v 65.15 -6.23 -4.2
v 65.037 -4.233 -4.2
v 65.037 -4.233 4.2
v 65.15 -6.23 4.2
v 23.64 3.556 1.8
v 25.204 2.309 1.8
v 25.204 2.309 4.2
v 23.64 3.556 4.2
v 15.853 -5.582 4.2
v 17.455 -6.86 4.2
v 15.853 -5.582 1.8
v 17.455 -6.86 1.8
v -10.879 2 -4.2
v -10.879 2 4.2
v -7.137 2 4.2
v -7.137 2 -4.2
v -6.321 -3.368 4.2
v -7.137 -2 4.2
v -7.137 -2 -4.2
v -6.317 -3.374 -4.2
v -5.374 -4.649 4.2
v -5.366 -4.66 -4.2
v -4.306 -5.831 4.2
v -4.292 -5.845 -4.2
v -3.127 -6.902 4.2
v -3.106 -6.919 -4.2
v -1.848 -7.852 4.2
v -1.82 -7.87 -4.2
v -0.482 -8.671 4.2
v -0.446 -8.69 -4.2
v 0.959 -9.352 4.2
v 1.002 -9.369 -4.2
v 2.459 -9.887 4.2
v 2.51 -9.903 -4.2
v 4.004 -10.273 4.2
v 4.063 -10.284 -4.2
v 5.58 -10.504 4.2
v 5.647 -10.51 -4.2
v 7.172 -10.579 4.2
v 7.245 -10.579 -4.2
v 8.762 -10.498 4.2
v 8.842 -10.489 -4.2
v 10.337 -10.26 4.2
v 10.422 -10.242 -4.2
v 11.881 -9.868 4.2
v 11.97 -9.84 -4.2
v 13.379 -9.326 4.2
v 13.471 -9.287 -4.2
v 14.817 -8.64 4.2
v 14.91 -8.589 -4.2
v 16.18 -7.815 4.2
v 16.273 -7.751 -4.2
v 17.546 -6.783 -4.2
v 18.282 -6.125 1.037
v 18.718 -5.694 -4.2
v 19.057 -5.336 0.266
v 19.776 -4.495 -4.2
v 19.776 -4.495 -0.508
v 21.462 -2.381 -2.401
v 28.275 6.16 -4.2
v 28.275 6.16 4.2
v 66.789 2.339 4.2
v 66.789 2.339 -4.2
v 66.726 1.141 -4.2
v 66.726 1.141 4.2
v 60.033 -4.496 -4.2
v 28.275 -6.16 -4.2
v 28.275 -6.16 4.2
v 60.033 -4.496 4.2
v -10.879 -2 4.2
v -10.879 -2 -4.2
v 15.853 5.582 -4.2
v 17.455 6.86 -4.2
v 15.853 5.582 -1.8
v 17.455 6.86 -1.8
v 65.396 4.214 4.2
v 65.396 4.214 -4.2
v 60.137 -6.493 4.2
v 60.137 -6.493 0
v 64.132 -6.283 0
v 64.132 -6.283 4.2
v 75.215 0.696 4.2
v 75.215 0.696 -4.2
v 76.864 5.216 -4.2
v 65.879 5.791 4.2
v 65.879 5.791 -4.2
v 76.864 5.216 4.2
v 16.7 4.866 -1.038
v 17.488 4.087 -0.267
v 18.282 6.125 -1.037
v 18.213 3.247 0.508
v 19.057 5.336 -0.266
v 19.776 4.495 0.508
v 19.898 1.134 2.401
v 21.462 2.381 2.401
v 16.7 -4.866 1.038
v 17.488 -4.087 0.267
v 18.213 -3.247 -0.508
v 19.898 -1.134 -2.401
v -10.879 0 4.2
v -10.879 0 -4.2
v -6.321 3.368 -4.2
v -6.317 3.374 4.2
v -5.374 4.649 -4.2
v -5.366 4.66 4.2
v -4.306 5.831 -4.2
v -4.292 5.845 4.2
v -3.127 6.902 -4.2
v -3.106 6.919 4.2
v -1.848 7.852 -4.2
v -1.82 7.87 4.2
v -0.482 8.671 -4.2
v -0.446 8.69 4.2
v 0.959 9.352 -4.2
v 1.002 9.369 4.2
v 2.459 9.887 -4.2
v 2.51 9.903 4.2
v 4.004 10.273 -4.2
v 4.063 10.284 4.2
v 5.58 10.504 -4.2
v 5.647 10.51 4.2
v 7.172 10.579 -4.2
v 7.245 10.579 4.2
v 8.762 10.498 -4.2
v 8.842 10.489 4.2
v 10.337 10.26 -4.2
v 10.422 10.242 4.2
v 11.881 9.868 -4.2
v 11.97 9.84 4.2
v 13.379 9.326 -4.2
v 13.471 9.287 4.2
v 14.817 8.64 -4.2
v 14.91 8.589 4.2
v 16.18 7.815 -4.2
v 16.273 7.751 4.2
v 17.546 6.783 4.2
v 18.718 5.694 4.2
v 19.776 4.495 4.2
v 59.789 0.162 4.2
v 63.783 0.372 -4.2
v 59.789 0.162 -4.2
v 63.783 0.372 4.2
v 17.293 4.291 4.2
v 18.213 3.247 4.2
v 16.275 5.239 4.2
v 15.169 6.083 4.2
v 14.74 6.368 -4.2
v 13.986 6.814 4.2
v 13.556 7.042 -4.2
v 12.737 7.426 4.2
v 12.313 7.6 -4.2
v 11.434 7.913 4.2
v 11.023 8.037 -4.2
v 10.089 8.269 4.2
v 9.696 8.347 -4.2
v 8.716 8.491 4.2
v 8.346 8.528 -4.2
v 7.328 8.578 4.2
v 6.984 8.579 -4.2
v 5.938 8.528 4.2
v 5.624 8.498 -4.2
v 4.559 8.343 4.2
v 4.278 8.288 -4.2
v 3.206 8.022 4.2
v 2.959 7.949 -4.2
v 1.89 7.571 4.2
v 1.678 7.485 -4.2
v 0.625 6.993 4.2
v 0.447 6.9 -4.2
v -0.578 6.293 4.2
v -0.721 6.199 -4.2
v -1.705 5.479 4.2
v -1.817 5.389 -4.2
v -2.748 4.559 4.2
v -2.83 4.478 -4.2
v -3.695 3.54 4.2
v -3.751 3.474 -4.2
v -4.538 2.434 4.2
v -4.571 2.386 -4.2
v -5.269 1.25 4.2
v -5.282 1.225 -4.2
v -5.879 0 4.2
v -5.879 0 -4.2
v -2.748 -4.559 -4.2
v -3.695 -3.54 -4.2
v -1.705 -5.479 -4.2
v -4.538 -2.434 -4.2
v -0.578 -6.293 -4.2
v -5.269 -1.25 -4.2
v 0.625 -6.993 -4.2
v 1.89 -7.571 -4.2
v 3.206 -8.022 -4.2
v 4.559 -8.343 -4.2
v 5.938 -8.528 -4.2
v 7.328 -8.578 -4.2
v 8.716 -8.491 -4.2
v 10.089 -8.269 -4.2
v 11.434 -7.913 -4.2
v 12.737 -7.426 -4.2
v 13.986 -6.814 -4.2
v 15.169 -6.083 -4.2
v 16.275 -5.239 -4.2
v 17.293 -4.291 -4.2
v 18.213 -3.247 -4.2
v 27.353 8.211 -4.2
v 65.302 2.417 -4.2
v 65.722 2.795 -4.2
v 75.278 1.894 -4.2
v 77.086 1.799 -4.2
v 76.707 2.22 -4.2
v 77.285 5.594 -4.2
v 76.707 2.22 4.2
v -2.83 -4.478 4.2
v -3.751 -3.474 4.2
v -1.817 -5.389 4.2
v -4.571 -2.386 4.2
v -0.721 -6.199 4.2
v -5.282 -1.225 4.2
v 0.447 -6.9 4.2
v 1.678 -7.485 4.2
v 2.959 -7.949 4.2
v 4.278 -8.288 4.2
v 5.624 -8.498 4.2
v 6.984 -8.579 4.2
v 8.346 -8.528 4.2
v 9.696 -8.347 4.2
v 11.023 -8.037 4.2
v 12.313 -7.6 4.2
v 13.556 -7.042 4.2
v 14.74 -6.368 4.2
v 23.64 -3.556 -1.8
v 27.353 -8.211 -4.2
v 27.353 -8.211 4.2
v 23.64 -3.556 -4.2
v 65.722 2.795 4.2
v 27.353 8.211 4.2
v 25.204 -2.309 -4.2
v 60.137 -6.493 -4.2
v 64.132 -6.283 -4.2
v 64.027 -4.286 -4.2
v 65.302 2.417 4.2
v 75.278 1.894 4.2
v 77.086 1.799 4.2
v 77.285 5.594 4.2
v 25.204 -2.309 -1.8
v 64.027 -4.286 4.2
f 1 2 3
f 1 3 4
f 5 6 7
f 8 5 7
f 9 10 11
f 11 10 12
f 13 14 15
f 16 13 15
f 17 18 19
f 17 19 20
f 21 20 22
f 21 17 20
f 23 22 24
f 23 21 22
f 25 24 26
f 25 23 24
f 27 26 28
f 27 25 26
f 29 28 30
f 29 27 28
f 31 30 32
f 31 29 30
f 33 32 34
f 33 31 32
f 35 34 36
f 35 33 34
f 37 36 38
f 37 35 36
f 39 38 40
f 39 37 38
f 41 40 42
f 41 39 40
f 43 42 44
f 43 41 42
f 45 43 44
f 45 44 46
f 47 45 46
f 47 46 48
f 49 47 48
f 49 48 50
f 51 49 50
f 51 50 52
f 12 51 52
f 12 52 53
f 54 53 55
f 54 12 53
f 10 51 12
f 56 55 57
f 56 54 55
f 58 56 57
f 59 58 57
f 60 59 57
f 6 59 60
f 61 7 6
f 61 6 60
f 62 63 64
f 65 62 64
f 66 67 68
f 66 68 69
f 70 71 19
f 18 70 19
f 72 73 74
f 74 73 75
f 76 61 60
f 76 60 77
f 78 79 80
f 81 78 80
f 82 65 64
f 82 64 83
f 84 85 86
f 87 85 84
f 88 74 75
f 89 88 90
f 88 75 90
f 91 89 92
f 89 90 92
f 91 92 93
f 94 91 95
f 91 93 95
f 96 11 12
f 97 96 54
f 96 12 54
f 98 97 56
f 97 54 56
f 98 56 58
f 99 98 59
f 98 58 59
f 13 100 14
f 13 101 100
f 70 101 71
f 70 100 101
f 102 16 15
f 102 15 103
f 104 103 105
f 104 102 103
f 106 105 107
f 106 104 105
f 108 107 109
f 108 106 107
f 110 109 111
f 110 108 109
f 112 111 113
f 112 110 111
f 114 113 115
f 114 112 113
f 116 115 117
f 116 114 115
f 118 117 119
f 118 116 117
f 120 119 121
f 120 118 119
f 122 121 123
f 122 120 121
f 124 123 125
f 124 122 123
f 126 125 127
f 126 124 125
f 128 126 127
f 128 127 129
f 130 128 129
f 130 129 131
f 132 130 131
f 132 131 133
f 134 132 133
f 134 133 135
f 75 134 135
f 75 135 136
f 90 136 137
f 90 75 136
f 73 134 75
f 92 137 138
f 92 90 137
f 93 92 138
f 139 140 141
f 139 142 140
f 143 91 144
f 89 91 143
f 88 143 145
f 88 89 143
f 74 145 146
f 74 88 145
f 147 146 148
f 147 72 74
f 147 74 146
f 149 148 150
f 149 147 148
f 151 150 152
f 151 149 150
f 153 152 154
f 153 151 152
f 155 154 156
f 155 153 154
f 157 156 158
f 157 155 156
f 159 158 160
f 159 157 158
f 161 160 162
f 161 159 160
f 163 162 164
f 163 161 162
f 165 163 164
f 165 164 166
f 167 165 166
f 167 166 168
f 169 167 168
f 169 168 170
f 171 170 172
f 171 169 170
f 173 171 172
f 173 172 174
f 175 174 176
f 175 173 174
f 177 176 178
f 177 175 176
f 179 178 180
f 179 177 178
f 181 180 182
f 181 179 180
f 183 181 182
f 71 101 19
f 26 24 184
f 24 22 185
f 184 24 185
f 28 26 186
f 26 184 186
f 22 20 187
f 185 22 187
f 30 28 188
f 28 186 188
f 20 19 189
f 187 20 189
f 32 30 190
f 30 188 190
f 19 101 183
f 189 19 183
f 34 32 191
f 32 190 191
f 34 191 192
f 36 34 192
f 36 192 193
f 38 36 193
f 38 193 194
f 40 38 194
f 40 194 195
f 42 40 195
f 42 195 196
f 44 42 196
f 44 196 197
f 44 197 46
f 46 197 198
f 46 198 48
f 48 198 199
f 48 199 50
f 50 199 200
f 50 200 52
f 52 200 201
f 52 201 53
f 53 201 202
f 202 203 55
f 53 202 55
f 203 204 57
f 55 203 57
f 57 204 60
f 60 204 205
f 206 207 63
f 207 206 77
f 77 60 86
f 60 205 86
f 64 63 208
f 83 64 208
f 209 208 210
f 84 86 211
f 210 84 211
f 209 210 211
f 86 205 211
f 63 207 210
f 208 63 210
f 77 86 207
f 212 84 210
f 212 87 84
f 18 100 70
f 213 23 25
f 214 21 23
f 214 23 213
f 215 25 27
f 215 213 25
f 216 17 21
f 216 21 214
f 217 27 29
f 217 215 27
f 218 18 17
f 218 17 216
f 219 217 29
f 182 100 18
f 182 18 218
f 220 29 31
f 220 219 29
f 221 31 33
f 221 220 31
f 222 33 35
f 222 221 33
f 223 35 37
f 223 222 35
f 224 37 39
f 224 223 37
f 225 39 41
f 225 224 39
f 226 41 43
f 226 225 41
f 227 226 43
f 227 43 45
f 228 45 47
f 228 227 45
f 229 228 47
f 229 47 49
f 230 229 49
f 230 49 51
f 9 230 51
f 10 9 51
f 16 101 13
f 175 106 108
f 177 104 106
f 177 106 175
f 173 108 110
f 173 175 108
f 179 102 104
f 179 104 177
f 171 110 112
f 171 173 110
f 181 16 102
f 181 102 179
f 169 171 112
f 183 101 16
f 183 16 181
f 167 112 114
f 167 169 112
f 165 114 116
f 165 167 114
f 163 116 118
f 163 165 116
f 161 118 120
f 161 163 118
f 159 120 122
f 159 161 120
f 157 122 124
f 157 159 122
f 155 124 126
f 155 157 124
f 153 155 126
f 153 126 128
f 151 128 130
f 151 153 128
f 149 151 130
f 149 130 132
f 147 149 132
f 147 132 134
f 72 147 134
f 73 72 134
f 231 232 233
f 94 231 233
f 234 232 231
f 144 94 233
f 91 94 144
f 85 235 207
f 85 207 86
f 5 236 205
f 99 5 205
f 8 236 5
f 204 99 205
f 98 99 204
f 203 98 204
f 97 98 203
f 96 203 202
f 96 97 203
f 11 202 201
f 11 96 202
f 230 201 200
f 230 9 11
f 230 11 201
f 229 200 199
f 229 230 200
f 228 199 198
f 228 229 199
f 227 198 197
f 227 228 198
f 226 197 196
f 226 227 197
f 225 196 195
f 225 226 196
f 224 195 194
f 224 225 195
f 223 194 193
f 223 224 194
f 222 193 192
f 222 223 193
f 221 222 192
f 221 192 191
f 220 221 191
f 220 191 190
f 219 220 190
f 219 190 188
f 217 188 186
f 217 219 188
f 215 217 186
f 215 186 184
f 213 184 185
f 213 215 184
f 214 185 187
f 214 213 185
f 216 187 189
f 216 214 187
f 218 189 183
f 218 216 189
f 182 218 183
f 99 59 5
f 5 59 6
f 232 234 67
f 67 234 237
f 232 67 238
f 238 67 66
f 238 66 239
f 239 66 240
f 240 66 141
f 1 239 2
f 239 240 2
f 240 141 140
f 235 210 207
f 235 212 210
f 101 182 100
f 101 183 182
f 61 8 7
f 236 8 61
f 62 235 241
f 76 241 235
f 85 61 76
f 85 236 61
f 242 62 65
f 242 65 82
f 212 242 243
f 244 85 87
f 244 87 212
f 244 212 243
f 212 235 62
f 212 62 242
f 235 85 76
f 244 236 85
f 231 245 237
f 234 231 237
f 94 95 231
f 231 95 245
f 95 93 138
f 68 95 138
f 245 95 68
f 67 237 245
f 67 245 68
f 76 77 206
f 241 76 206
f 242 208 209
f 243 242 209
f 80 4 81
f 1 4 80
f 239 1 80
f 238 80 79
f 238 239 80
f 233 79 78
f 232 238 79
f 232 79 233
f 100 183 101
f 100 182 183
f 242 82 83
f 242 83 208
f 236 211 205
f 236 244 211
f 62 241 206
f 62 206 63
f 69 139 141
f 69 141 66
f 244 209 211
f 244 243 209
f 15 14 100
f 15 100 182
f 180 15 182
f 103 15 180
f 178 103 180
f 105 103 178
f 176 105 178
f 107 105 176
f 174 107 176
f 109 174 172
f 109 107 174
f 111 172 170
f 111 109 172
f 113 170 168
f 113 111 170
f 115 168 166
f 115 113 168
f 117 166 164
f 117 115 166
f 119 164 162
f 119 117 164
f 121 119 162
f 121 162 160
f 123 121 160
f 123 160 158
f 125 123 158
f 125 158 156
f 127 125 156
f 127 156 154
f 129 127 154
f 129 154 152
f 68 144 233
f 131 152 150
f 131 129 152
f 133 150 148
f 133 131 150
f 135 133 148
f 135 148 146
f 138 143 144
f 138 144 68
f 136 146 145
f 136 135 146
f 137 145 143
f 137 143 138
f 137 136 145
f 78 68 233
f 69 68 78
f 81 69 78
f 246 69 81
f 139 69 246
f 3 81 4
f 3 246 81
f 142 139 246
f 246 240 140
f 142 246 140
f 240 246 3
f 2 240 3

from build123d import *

# Parameters (mm, degrees)
F1_DEPTH       = 4.2
F1_DEPTH_BACK  = 4.2
F3_DEPTH       = 2.3899539343
F8_DEPTH       = 4.201
F8_DEPTH_BACK  = 4.201
F10_DEPTH      = 4.2
F10_DEPTH_BACK = 4.2


with BuildPart() as f1:
    # F0 (on Top) → F1 (new body, two sides)
    with BuildSketch(Plane.XY) as f1_sk:
        with BuildLine():
            Line((-10.8792186327, -2), (-7.1365965526, -2))
            ThreePointArc((-7.1365965526, -2), (5.646501714, -10.5104124957), (19.7761137083, -4.4947008144))
            Line((19.7761137083, -4.4947008144), (28.275484559, 6.1598713066))
            Line((28.275484559, 6.1598713066), (65.3962421786, 4.2144548345))
            Line((65.3962421786, 4.2144548345), (65.3020374574, 2.4169216719))
            Line((65.3020374574, 2.4169216719), (66.7891790661, 2.3389838827))
            Line((66.7891790661, 2.3389838827), (66.7263759186, 1.140628441))
            Line((66.7263759186, 1.140628441), (75.2147269641, 0.6957728129))
            Line((75.2147269641, 0.6957728129), (75.2775301115, 1.8941282546))
            Line((75.2775301115, 1.8941282546), (77.0858659675, 1.7993573882))
            Line((77.0858659675, 1.7993573882), (77.2847426012, 5.5941496203))
            Line((77.2847426012, 5.5941496203), (27.3532658635, 8.2109474325))
            Line((27.3532658635, 8.2109474325), (18.2126391118, -3.2474850407))
            ThreePointArc((18.2126391118, -3.2474850407), (5.246227801, -8.452452026), (-5.8792186327, 0))
            Line((-5.8792186327, 0), (-10.8792186327, 0))
            Line((-10.8792186327, 0), (-10.8792186327, -2))
        make_face()
        Polygon((65.7224236538, 2.7954391033), (65.8794315225, 5.7913277076), (76.8643564048, 5.2156321889), (76.7073485361, 2.2197435846), align=None, mode=Mode.SUBTRACT)
    extrude(amount=F1_DEPTH)
    extrude(f1_sk.sketch, amount=-F1_DEPTH_BACK)

    # F2 (on face) → F3 (cut, through all)
    with BuildSketch(Plane(origin=(14.2765998113, -11.3887366761, 0), x_dir=(0.6236078868, 0.7817372982, 0), z_dir=(0.7817372982, -0.6236078868, 0))):
        Polygon((17.5221264362, 4.2), (5.5221264362, 4.2), (5.5221264362, 1.8), (11.5221264362, -2.4012452293), (17.5221264362, 1.8), align=None)
    extrude(amount=-F3_DEPTH, mode=Mode.SUBTRACT)


with BuildPart() as f4_1:
    # F4: instance of F1
    add(f1.part.mirror(Plane.XY))


with BuildPart() as f5_1:
    # F5: instance of F4_1
    add(f4_1.part.mirror(Plane.XZ))

    # F7 (on Top) → F8 (cut, two sides)
    with BuildSketch(Plane.XY) as f8_sk:
        Polygon((80.845810473, 0), (64.7967691847, 0), (65.4192110984, -10.977292532), (80.845810473, -9.1759832576), align=None)
    extrude(amount=-F8_DEPTH, mode=Mode.SUBTRACT)
    extrude(f8_sk.sketch, amount=F8_DEPTH_BACK, mode=Mode.SUBTRACT)

    # F9 (on Top) → F10 (join, two sides)
    with BuildSketch(Plane.XY) as f10_sk:
        Polygon((63.7832002076, 0.3717972424), (59.7886820686, 0.1624534174), (60.1374691283, -6.4928001438), (64.1319872673, -6.2834563188), align=None)
    extrude(amount=F10_DEPTH)
    extrude(f10_sk.sketch, amount=-F10_DEPTH_BACK)


solid = Compound([f1.part, f5_1.part])
